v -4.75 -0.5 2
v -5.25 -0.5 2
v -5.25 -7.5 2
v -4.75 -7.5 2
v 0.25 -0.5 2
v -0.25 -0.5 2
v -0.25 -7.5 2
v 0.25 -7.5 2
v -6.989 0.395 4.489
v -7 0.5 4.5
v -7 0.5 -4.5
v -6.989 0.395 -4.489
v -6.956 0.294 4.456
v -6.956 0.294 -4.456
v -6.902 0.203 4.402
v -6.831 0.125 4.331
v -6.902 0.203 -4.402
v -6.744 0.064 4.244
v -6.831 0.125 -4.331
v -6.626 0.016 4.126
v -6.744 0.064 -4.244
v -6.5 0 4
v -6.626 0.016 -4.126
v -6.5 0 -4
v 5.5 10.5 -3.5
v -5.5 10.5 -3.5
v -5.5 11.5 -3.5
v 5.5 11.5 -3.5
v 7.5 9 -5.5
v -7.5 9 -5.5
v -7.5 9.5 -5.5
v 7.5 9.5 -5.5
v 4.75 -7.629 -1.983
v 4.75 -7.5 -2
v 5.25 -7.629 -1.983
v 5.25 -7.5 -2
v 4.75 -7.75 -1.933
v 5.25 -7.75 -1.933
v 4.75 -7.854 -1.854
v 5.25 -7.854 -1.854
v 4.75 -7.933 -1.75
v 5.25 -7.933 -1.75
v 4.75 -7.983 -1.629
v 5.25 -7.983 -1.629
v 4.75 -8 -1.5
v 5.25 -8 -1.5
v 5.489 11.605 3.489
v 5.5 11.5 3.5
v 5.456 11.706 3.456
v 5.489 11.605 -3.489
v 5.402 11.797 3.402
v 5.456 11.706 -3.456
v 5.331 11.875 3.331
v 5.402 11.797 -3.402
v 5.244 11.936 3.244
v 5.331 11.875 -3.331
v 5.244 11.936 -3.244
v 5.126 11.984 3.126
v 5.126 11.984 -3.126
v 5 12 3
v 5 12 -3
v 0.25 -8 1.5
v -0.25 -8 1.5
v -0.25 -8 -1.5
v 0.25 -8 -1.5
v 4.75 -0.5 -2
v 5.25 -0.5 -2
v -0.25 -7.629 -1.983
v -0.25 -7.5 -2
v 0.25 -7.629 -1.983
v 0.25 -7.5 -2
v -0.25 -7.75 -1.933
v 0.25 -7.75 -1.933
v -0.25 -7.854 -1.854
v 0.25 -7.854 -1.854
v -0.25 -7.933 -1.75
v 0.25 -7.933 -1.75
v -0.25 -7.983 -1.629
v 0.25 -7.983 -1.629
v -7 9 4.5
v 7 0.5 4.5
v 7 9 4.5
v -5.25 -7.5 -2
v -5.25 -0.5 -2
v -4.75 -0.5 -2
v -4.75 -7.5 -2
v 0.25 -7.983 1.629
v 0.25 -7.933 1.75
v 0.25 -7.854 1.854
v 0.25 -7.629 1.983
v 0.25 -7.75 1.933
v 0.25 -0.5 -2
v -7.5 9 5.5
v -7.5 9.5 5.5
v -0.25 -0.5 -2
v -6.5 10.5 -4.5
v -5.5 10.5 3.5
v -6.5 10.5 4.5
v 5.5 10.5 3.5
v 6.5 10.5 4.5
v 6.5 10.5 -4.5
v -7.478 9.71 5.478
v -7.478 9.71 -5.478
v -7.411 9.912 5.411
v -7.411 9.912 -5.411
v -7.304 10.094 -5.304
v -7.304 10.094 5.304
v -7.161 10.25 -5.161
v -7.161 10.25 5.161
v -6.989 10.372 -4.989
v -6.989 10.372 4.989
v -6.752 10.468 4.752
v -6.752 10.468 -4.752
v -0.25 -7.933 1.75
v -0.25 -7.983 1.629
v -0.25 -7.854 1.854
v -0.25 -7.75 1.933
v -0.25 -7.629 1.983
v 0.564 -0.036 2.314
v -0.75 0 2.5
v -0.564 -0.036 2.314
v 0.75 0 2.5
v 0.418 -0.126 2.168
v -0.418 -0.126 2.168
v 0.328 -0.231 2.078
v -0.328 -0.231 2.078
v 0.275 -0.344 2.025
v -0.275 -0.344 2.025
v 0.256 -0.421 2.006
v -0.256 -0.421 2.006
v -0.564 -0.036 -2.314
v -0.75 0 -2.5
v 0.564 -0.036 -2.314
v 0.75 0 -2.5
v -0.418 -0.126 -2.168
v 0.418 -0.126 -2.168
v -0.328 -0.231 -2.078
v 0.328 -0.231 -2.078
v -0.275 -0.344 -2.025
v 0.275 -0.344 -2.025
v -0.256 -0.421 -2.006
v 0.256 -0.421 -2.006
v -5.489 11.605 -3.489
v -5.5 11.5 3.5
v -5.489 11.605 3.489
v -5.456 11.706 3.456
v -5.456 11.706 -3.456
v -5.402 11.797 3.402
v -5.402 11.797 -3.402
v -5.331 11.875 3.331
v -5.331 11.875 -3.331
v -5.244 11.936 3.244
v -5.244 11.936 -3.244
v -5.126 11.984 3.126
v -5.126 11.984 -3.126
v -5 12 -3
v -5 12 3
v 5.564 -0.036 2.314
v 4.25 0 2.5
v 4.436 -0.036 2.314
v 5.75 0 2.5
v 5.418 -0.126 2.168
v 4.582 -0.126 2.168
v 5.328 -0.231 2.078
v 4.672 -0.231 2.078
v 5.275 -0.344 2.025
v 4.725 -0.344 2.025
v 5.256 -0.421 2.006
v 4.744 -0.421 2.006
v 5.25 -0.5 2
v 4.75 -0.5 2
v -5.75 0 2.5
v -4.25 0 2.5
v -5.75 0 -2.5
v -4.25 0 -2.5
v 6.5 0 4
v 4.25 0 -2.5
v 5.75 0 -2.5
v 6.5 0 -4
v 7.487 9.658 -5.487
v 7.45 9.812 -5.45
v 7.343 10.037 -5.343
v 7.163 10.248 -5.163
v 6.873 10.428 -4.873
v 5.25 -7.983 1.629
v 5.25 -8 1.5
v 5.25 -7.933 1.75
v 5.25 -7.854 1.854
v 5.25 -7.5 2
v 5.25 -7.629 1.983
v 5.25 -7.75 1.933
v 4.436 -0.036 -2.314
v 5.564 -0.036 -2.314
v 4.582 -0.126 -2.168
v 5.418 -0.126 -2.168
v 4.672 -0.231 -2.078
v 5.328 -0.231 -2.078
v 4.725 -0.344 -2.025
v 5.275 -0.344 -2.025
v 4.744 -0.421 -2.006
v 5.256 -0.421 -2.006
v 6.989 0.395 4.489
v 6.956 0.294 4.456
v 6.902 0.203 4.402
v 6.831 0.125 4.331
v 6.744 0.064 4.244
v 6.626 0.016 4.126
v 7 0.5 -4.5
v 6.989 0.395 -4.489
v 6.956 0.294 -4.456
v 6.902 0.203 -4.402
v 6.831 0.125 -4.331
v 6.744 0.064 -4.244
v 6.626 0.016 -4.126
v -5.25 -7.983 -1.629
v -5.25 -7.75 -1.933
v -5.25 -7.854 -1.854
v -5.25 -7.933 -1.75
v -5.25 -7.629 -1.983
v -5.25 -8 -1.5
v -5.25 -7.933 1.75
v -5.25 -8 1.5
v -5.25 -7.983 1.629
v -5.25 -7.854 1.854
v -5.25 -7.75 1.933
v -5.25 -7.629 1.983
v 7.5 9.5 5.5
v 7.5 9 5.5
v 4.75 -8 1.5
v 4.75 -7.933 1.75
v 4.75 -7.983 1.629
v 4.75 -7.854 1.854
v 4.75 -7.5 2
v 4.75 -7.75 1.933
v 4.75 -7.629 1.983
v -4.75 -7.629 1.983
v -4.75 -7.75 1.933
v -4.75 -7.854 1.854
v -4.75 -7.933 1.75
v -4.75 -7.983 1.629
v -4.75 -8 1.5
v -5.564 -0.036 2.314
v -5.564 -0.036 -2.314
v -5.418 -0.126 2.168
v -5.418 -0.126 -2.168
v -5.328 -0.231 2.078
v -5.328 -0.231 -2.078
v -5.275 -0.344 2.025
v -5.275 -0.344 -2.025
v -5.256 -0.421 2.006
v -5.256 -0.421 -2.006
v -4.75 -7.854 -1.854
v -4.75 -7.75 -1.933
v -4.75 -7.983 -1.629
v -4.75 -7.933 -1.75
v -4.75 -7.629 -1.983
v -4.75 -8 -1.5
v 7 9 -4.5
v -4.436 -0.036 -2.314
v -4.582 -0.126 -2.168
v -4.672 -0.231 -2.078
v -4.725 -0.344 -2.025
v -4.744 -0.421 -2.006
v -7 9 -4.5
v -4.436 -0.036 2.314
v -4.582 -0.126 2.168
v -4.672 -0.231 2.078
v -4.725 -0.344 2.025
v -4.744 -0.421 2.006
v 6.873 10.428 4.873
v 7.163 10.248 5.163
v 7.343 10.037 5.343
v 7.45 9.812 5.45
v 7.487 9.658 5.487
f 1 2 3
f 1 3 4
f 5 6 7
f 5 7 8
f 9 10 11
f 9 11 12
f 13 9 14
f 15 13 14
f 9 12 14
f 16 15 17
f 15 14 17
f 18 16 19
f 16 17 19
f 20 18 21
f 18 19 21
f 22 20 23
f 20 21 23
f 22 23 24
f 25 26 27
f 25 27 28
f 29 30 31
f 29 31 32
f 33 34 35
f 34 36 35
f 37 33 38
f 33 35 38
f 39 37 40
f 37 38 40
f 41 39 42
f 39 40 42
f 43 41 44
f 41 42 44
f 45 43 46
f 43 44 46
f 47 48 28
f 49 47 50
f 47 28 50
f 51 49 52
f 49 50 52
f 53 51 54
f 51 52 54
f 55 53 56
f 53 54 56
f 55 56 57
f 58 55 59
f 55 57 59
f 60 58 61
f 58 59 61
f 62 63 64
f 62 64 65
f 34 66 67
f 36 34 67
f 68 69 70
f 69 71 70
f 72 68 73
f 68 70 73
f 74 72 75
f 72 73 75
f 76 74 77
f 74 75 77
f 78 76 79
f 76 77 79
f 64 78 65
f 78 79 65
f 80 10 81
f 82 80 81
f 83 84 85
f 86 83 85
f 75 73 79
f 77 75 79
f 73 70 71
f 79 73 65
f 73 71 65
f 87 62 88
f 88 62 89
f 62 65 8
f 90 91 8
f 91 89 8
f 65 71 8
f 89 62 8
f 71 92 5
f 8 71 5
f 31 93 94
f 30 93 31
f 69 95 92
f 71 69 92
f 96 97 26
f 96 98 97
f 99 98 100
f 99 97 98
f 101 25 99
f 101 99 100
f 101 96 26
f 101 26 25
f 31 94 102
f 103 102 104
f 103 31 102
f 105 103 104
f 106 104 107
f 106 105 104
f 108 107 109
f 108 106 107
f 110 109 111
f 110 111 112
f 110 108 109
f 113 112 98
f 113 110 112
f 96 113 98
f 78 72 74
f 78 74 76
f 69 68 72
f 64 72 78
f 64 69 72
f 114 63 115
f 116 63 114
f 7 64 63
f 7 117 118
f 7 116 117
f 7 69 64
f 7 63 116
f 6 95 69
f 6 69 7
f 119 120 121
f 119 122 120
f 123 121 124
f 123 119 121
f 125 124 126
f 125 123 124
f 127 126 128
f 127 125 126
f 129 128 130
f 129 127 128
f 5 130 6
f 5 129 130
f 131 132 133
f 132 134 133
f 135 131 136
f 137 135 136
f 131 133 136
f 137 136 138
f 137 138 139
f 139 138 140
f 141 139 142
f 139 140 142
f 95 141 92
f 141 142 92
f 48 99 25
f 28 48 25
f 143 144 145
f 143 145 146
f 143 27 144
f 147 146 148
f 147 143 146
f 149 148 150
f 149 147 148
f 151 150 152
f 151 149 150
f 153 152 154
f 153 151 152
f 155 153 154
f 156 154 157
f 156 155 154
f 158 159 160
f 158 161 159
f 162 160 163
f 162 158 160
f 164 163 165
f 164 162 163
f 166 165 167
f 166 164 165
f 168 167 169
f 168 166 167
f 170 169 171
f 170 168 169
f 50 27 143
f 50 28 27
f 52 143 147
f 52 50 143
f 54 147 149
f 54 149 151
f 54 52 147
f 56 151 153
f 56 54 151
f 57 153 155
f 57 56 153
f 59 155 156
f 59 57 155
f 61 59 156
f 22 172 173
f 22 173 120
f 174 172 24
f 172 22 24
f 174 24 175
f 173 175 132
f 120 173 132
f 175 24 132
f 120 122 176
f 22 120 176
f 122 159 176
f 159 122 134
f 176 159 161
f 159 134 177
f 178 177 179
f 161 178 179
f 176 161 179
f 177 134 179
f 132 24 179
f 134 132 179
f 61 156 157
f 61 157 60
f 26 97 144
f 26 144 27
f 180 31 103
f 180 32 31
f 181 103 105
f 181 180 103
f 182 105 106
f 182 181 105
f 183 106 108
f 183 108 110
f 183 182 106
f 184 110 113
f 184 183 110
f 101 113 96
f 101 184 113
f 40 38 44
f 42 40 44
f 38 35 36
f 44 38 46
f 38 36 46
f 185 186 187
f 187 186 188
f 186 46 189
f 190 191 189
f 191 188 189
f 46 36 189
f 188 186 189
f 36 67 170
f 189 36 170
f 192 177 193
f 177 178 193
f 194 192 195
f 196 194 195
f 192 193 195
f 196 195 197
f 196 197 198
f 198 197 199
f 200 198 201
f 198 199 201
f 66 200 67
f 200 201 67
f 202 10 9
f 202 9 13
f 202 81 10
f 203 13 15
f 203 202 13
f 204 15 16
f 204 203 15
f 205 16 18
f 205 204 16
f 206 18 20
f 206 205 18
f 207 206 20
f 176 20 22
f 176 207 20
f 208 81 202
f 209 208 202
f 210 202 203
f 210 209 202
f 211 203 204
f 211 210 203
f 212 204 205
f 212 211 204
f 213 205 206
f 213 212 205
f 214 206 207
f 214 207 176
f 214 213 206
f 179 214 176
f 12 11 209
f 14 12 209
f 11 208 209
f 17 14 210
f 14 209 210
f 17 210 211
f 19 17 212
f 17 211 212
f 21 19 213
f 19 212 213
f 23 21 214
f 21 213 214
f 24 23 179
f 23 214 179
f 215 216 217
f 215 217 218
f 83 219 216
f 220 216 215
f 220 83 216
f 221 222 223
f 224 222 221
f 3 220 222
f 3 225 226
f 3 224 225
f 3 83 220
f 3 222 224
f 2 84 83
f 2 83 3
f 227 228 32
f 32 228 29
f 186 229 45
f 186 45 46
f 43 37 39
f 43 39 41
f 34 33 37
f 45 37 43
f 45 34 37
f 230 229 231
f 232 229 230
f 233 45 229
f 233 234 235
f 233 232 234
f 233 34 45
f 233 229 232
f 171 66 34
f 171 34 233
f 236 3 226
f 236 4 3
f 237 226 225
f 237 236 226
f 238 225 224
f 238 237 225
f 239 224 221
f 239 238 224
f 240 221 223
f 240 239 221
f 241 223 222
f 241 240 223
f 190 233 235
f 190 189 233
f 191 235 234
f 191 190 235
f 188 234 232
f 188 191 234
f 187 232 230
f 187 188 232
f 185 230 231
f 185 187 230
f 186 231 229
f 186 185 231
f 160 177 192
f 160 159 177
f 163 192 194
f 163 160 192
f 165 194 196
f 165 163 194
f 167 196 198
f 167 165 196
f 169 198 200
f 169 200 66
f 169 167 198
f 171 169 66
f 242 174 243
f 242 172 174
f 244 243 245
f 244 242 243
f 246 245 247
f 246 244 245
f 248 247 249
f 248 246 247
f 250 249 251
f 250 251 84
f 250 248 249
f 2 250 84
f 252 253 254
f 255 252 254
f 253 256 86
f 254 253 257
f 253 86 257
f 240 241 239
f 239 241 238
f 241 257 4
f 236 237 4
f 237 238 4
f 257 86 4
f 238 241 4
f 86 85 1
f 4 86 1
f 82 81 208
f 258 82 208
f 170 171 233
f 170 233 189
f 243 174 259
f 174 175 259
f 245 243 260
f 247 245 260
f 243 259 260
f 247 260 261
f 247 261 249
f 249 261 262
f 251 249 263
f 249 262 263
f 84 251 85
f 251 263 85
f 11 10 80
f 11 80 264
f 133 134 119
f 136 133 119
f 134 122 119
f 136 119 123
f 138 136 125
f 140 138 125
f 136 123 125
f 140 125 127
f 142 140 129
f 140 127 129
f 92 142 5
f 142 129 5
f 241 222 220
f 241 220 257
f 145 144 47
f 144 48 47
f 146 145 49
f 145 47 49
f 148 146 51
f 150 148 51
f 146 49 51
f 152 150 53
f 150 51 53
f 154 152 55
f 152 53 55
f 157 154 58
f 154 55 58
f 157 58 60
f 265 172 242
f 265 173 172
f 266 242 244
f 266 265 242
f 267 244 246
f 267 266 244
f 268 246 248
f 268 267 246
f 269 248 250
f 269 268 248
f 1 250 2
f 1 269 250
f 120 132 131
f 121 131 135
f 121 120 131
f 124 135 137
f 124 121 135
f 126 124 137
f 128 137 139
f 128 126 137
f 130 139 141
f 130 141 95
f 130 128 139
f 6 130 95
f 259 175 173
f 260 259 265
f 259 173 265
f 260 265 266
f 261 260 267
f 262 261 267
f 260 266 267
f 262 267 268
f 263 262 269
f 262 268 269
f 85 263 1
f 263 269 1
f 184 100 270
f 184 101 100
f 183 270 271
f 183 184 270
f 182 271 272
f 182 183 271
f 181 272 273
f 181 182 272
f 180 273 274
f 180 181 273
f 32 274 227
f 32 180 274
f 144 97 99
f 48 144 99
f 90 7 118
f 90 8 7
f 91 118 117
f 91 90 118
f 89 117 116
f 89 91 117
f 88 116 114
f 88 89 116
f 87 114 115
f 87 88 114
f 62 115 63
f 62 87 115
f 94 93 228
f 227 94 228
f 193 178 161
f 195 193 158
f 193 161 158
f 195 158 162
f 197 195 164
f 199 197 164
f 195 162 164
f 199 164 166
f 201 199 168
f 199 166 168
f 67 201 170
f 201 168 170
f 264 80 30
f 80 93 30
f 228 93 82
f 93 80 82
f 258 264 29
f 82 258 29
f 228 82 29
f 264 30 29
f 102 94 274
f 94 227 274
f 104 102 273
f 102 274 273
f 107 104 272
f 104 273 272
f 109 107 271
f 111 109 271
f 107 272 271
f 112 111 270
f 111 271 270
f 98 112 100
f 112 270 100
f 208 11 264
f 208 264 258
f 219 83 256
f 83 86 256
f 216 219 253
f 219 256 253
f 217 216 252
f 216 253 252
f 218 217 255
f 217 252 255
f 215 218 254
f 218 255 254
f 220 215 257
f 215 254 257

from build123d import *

# Parameters (mm, degrees)
SKETCH_1_W      = 14
SKETCH_1_H      = 9
EXTRUDE_1_DEPTH = 9
SKETCH_2_W      = 15
SKETCH_2_H      = 11
EXTRUDE_2_DEPTH = 1.5
SKETCH_3_W      = 11
SKETCH_3_H      = 7
EXTRUDE_3_DEPTH = 1.5
SKETCH_4_W      = 0.5
SKETCH_4_H      = 4
EXTRUDE_4_DEPTH = 8
FILLET_1_R      = 1
FILLET_2_R      = 0.5
FILLET_3_R      = 0.5
FILLET_4_R      = 0.5


with BuildPart() as part:
    # Эскиз1 → Бобышка-Вытянуть1 (new body)
    with BuildSketch(Plane(origin=(0, 0, 0), x_dir=(1, 0, 0), z_dir=(0, 1, 0))):
        Rectangle(SKETCH_1_W, SKETCH_1_H)
    extrude(amount=EXTRUDE_1_DEPTH)

    # Эскиз2 → Бобышка-Вытянуть2 (add)
    with BuildSketch(Plane(origin=(0, 9, 0), x_dir=(1, 0, 0), z_dir=(0, 1, 0))):
        Rectangle(SKETCH_2_W, SKETCH_2_H)
    extrude(amount=EXTRUDE_2_DEPTH)

    # Эскиз3 → Бобышка-Вытянуть3 (add)
    with BuildSketch(Plane(origin=(0, 10.5, 0), x_dir=(1, 0, 0), z_dir=(0, 1, 0))):
        Rectangle(SKETCH_3_W, SKETCH_3_H)
    extrude(amount=EXTRUDE_3_DEPTH)

    # Эскиз4 → Бобышка-Вытянуть4 (add)
    with BuildSketch(Plane.XZ):
        Rectangle(SKETCH_4_W, SKETCH_4_H)
        with Locations((5, 0)):
            Rectangle(SKETCH_4_W, SKETCH_4_H)
        with Locations((-5, 0)):
            Rectangle(SKETCH_4_W, SKETCH_4_H)
    extrude(amount=EXTRUDE_4_DEPTH)

    # Скругление1
    fillet_1_edges = [part.edges().sort_by_distance(p)[0] for p in [
        (7.5, 10.5, 0),
        (0, 10.5, -5.5),
        (-7.5, 10.5, 0),
        (0, 10.5, 5.5),
    ]]
    fillet(fillet_1_edges, radius=FILLET_1_R)

    # Скругление2
    fillet_2_edges = [part.edges().sort_by_distance(p)[0] for p in [
        (5.5, 12, 0),
        (0, 12, -3.5),
        (-5.5, 12, 0),
        (0, 12, 3.5),
    ]]
    fillet(fillet_2_edges, radius=FILLET_2_R)

    # Скругление3
    fillet_3_edges = [part.edges().sort_by_distance(p)[0] for p in [
        (0, 0, 4.5),
        (-7, 0, 0),
        (0, 0, -4.5),
        (7, 0, 0),
    ]]
    fillet(fillet_3_edges, radius=FILLET_3_R)

    # Скругление4
    fillet_4_edges = [part.edges().sort_by_distance(p)[0] for p in [
        (0, 0, -2),
        (0.25, 0, 0),
        (0, -8, 2),
        (0, -8, -2),
        (-0.25, 0, 0),
        (0, 0, 2),
        (5, 0, -2),
        (5.25, 0, 0),
        (5, -8, 2),
        (5, -8, -2),
        (4.75, 0, 0),
        (5, 0, 2),
        (-5, 0, -2),
        (-4.75, 0, 0),
        (-5, -8, 2),
        (-5, -8, -2),
        (-5.25, 0, 0),
        (-5, 0, 2),
    ]]
    fillet(fillet_4_edges, radius=FILLET_4_R)


solid = part.part
